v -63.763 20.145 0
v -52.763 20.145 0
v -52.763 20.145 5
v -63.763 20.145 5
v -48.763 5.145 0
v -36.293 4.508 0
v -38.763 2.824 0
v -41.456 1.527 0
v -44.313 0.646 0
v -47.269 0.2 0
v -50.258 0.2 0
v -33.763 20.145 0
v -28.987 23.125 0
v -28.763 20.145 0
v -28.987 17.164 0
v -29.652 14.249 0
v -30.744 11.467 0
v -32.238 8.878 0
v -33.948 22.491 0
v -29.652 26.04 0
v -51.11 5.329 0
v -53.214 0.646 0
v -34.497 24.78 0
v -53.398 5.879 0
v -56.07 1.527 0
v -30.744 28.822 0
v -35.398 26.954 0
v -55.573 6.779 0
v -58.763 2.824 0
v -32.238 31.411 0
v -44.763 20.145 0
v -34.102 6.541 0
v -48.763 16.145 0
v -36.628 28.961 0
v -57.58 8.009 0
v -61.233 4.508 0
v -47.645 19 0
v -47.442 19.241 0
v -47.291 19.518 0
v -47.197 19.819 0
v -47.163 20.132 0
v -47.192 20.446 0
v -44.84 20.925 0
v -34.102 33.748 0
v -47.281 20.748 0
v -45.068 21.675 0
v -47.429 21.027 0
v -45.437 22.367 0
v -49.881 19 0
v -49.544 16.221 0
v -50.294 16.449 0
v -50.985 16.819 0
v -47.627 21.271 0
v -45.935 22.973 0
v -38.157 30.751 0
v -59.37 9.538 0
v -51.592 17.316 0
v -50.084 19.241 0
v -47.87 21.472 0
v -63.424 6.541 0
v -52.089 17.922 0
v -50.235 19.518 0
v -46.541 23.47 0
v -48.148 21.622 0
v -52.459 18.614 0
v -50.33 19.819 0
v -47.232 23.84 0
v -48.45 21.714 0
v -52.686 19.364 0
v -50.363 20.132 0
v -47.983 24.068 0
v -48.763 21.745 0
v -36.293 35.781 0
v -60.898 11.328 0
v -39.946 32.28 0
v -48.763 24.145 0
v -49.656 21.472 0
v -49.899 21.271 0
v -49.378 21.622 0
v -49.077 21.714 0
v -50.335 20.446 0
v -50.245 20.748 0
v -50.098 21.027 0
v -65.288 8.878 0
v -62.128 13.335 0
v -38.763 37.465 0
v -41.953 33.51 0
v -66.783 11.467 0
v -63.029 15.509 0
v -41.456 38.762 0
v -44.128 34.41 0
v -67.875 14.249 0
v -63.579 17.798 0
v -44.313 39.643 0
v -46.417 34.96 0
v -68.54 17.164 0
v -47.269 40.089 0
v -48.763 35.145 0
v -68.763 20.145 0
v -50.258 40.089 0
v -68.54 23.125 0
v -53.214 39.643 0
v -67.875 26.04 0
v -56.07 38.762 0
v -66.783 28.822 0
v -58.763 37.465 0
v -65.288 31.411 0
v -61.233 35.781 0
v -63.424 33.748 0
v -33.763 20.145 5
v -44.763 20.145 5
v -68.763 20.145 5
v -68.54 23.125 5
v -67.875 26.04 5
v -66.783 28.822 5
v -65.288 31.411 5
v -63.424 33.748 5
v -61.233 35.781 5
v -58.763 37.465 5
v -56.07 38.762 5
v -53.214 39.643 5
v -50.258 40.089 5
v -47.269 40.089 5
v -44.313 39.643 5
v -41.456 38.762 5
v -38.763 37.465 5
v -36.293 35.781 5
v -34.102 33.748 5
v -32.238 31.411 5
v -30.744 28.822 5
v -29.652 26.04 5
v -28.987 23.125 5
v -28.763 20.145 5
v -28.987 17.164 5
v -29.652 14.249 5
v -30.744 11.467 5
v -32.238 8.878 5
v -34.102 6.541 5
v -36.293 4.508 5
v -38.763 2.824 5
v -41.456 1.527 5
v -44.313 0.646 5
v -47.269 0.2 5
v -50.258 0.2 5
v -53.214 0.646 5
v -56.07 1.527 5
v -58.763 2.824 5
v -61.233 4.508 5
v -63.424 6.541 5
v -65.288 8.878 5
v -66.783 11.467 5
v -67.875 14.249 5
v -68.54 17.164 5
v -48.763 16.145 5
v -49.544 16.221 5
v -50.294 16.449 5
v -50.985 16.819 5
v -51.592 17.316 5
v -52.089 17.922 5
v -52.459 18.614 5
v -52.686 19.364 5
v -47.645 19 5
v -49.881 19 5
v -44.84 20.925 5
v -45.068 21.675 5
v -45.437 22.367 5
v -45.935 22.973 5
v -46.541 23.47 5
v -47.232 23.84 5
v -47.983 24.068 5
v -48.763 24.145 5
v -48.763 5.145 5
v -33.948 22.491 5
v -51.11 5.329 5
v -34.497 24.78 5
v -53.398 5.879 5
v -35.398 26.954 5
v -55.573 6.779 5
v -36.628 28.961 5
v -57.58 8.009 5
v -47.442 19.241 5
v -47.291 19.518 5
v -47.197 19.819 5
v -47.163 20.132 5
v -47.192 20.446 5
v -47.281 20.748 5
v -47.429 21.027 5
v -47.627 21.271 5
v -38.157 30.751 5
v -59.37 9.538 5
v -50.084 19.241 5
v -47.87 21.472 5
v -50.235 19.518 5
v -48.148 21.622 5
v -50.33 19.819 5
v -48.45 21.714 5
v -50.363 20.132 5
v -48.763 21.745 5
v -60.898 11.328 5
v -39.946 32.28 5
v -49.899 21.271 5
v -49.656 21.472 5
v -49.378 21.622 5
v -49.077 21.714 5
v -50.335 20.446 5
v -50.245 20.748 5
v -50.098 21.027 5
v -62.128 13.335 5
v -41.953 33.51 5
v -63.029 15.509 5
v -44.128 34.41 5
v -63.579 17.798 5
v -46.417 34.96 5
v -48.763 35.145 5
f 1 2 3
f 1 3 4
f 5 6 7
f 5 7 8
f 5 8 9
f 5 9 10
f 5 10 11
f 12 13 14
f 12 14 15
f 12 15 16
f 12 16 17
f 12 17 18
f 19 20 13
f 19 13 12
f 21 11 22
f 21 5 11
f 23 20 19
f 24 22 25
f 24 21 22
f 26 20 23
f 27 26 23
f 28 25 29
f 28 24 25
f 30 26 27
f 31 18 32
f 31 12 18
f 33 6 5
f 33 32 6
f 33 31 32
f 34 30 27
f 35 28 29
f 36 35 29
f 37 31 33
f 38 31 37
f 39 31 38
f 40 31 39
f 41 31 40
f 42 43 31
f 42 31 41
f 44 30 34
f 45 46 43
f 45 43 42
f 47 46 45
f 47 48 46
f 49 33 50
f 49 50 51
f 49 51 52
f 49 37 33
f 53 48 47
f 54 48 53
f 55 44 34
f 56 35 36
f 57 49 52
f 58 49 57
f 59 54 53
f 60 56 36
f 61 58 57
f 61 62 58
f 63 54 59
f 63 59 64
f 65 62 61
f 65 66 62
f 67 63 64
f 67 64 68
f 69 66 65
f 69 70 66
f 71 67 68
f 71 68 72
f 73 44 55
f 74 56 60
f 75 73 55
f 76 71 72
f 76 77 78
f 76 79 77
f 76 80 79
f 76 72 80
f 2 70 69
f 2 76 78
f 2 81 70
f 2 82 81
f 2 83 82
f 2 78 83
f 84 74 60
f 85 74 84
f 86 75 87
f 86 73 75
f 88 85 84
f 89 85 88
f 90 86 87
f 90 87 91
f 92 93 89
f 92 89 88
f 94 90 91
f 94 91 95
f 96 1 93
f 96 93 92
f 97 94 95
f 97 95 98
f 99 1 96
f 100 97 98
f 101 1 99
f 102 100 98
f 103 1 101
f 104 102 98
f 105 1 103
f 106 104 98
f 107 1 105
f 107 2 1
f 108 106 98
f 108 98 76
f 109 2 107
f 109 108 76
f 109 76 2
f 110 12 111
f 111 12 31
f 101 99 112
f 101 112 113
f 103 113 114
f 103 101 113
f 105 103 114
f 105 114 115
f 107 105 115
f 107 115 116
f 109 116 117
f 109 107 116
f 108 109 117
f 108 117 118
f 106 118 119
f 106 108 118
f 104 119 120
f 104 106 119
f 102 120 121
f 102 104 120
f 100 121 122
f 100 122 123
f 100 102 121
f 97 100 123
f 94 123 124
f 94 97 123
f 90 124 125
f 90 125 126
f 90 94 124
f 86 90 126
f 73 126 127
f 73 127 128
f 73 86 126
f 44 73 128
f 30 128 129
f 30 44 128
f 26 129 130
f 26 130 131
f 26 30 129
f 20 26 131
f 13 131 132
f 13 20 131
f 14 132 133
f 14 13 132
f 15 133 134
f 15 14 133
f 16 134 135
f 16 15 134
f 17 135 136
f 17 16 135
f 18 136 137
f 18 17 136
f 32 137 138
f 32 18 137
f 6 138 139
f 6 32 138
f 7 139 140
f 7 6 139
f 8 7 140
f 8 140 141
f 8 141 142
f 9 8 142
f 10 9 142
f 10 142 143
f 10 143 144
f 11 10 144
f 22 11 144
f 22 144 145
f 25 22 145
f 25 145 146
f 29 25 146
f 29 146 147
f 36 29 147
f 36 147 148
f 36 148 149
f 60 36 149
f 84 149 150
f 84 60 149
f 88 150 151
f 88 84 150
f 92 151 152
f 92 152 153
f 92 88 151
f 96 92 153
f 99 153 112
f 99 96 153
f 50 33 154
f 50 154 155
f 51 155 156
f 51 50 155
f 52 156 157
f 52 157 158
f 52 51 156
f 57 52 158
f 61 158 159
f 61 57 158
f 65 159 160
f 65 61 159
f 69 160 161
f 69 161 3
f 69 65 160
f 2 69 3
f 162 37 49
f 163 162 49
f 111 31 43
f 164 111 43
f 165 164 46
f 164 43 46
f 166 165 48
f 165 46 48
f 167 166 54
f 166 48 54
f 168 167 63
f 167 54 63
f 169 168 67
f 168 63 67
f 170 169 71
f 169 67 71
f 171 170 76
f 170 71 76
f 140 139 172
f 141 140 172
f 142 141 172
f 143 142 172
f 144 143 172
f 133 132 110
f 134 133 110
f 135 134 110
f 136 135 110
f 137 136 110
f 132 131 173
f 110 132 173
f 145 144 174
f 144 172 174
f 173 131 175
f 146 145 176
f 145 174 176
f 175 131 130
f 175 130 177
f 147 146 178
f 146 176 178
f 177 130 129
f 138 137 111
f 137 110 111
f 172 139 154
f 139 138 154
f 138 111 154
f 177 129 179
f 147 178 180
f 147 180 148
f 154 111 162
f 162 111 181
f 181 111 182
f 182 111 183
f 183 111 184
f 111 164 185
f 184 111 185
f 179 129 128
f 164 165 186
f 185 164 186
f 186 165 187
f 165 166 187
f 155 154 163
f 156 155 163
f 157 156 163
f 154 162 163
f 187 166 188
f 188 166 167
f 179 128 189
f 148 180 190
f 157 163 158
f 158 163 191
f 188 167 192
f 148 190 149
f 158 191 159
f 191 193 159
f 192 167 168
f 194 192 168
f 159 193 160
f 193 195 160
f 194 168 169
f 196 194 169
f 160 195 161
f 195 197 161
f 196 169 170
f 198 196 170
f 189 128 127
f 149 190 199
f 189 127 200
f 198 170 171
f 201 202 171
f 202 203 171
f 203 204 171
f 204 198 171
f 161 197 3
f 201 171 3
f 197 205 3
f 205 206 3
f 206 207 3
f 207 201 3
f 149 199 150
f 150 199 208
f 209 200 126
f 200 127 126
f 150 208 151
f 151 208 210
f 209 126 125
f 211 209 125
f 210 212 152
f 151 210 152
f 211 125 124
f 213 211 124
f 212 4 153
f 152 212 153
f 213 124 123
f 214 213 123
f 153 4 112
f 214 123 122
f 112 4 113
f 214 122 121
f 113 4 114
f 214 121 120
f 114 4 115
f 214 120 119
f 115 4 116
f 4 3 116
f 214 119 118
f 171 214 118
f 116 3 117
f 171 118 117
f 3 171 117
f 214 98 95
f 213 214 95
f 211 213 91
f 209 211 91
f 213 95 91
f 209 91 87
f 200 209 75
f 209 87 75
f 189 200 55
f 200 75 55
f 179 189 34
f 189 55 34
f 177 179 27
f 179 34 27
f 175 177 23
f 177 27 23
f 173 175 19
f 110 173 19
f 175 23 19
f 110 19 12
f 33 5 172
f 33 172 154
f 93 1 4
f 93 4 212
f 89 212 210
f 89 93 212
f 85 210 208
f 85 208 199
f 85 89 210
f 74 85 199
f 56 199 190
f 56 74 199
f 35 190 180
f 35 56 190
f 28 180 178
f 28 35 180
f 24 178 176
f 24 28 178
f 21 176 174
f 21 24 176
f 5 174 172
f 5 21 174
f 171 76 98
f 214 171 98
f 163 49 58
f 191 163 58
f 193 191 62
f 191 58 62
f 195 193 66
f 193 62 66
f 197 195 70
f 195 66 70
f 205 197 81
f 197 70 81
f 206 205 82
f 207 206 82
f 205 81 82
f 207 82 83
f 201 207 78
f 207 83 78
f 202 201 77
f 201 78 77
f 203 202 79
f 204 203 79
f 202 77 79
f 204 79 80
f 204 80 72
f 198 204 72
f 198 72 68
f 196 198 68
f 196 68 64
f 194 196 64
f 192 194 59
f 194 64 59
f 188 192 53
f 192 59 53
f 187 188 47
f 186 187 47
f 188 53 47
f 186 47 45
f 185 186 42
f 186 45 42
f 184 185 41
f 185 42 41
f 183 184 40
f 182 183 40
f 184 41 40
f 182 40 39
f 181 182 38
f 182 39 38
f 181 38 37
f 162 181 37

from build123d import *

# Parameters (mm, degrees)
ESBO_O1_R                = 20
RESSALTO_EXTRUS_O1_DEPTH = 4.999999888


with BuildPart() as part:
    # Esboço1 → Ressalto-extrusão1 (new body)
    with BuildSketch(Plane(origin=(0, 0, 0), x_dir=(-1, 0, 0), z_dir=(0, 0, -1))):
        with Locations((48.763208571, 20.144551867)):
            Circle(ESBO_O1_R)
        with BuildLine():
            Line((47.645174582, 18.999999553), (49.881242559, 18.999999553))
            ThreePointArc((49.881242559, 18.999999553), (48.763208571, 21.744551867), (47.645174582, 18.999999553))
        make_face(mode=Mode.SUBTRACT)
        with BuildLine():
            Line((48.763208571, 24.144551867), (48.763208571, 35.144551867))
            ThreePointArc((48.763208571, 35.144551867), (38.156606853, 30.751153585), (33.763208571, 20.144551867))
            Line((33.763208571, 20.144551867), (44.763208571, 20.144551867))
            ThreePointArc((44.763208571, 20.144551867), (45.934781446, 22.972978992), (48.763208571, 24.144551867))
        make_face(mode=Mode.SUBTRACT)
        with BuildLine():
            Line((48.763208571, 5.144551867), (48.763208571, 16.144551867))
            ThreePointArc((48.763208571, 16.144551867), (51.591635695, 17.316124742), (52.763208571, 20.144551867))
            Line((52.763208571, 20.144551867), (63.763208571, 20.144551867))
            ThreePointArc((63.763208571, 20.144551867), (59.369810288, 9.537950149), (48.763208571, 5.144551867))
        make_face(mode=Mode.SUBTRACT)
    extrude(amount=-RESSALTO_EXTRUS_O1_DEPTH)


solid = part.part
